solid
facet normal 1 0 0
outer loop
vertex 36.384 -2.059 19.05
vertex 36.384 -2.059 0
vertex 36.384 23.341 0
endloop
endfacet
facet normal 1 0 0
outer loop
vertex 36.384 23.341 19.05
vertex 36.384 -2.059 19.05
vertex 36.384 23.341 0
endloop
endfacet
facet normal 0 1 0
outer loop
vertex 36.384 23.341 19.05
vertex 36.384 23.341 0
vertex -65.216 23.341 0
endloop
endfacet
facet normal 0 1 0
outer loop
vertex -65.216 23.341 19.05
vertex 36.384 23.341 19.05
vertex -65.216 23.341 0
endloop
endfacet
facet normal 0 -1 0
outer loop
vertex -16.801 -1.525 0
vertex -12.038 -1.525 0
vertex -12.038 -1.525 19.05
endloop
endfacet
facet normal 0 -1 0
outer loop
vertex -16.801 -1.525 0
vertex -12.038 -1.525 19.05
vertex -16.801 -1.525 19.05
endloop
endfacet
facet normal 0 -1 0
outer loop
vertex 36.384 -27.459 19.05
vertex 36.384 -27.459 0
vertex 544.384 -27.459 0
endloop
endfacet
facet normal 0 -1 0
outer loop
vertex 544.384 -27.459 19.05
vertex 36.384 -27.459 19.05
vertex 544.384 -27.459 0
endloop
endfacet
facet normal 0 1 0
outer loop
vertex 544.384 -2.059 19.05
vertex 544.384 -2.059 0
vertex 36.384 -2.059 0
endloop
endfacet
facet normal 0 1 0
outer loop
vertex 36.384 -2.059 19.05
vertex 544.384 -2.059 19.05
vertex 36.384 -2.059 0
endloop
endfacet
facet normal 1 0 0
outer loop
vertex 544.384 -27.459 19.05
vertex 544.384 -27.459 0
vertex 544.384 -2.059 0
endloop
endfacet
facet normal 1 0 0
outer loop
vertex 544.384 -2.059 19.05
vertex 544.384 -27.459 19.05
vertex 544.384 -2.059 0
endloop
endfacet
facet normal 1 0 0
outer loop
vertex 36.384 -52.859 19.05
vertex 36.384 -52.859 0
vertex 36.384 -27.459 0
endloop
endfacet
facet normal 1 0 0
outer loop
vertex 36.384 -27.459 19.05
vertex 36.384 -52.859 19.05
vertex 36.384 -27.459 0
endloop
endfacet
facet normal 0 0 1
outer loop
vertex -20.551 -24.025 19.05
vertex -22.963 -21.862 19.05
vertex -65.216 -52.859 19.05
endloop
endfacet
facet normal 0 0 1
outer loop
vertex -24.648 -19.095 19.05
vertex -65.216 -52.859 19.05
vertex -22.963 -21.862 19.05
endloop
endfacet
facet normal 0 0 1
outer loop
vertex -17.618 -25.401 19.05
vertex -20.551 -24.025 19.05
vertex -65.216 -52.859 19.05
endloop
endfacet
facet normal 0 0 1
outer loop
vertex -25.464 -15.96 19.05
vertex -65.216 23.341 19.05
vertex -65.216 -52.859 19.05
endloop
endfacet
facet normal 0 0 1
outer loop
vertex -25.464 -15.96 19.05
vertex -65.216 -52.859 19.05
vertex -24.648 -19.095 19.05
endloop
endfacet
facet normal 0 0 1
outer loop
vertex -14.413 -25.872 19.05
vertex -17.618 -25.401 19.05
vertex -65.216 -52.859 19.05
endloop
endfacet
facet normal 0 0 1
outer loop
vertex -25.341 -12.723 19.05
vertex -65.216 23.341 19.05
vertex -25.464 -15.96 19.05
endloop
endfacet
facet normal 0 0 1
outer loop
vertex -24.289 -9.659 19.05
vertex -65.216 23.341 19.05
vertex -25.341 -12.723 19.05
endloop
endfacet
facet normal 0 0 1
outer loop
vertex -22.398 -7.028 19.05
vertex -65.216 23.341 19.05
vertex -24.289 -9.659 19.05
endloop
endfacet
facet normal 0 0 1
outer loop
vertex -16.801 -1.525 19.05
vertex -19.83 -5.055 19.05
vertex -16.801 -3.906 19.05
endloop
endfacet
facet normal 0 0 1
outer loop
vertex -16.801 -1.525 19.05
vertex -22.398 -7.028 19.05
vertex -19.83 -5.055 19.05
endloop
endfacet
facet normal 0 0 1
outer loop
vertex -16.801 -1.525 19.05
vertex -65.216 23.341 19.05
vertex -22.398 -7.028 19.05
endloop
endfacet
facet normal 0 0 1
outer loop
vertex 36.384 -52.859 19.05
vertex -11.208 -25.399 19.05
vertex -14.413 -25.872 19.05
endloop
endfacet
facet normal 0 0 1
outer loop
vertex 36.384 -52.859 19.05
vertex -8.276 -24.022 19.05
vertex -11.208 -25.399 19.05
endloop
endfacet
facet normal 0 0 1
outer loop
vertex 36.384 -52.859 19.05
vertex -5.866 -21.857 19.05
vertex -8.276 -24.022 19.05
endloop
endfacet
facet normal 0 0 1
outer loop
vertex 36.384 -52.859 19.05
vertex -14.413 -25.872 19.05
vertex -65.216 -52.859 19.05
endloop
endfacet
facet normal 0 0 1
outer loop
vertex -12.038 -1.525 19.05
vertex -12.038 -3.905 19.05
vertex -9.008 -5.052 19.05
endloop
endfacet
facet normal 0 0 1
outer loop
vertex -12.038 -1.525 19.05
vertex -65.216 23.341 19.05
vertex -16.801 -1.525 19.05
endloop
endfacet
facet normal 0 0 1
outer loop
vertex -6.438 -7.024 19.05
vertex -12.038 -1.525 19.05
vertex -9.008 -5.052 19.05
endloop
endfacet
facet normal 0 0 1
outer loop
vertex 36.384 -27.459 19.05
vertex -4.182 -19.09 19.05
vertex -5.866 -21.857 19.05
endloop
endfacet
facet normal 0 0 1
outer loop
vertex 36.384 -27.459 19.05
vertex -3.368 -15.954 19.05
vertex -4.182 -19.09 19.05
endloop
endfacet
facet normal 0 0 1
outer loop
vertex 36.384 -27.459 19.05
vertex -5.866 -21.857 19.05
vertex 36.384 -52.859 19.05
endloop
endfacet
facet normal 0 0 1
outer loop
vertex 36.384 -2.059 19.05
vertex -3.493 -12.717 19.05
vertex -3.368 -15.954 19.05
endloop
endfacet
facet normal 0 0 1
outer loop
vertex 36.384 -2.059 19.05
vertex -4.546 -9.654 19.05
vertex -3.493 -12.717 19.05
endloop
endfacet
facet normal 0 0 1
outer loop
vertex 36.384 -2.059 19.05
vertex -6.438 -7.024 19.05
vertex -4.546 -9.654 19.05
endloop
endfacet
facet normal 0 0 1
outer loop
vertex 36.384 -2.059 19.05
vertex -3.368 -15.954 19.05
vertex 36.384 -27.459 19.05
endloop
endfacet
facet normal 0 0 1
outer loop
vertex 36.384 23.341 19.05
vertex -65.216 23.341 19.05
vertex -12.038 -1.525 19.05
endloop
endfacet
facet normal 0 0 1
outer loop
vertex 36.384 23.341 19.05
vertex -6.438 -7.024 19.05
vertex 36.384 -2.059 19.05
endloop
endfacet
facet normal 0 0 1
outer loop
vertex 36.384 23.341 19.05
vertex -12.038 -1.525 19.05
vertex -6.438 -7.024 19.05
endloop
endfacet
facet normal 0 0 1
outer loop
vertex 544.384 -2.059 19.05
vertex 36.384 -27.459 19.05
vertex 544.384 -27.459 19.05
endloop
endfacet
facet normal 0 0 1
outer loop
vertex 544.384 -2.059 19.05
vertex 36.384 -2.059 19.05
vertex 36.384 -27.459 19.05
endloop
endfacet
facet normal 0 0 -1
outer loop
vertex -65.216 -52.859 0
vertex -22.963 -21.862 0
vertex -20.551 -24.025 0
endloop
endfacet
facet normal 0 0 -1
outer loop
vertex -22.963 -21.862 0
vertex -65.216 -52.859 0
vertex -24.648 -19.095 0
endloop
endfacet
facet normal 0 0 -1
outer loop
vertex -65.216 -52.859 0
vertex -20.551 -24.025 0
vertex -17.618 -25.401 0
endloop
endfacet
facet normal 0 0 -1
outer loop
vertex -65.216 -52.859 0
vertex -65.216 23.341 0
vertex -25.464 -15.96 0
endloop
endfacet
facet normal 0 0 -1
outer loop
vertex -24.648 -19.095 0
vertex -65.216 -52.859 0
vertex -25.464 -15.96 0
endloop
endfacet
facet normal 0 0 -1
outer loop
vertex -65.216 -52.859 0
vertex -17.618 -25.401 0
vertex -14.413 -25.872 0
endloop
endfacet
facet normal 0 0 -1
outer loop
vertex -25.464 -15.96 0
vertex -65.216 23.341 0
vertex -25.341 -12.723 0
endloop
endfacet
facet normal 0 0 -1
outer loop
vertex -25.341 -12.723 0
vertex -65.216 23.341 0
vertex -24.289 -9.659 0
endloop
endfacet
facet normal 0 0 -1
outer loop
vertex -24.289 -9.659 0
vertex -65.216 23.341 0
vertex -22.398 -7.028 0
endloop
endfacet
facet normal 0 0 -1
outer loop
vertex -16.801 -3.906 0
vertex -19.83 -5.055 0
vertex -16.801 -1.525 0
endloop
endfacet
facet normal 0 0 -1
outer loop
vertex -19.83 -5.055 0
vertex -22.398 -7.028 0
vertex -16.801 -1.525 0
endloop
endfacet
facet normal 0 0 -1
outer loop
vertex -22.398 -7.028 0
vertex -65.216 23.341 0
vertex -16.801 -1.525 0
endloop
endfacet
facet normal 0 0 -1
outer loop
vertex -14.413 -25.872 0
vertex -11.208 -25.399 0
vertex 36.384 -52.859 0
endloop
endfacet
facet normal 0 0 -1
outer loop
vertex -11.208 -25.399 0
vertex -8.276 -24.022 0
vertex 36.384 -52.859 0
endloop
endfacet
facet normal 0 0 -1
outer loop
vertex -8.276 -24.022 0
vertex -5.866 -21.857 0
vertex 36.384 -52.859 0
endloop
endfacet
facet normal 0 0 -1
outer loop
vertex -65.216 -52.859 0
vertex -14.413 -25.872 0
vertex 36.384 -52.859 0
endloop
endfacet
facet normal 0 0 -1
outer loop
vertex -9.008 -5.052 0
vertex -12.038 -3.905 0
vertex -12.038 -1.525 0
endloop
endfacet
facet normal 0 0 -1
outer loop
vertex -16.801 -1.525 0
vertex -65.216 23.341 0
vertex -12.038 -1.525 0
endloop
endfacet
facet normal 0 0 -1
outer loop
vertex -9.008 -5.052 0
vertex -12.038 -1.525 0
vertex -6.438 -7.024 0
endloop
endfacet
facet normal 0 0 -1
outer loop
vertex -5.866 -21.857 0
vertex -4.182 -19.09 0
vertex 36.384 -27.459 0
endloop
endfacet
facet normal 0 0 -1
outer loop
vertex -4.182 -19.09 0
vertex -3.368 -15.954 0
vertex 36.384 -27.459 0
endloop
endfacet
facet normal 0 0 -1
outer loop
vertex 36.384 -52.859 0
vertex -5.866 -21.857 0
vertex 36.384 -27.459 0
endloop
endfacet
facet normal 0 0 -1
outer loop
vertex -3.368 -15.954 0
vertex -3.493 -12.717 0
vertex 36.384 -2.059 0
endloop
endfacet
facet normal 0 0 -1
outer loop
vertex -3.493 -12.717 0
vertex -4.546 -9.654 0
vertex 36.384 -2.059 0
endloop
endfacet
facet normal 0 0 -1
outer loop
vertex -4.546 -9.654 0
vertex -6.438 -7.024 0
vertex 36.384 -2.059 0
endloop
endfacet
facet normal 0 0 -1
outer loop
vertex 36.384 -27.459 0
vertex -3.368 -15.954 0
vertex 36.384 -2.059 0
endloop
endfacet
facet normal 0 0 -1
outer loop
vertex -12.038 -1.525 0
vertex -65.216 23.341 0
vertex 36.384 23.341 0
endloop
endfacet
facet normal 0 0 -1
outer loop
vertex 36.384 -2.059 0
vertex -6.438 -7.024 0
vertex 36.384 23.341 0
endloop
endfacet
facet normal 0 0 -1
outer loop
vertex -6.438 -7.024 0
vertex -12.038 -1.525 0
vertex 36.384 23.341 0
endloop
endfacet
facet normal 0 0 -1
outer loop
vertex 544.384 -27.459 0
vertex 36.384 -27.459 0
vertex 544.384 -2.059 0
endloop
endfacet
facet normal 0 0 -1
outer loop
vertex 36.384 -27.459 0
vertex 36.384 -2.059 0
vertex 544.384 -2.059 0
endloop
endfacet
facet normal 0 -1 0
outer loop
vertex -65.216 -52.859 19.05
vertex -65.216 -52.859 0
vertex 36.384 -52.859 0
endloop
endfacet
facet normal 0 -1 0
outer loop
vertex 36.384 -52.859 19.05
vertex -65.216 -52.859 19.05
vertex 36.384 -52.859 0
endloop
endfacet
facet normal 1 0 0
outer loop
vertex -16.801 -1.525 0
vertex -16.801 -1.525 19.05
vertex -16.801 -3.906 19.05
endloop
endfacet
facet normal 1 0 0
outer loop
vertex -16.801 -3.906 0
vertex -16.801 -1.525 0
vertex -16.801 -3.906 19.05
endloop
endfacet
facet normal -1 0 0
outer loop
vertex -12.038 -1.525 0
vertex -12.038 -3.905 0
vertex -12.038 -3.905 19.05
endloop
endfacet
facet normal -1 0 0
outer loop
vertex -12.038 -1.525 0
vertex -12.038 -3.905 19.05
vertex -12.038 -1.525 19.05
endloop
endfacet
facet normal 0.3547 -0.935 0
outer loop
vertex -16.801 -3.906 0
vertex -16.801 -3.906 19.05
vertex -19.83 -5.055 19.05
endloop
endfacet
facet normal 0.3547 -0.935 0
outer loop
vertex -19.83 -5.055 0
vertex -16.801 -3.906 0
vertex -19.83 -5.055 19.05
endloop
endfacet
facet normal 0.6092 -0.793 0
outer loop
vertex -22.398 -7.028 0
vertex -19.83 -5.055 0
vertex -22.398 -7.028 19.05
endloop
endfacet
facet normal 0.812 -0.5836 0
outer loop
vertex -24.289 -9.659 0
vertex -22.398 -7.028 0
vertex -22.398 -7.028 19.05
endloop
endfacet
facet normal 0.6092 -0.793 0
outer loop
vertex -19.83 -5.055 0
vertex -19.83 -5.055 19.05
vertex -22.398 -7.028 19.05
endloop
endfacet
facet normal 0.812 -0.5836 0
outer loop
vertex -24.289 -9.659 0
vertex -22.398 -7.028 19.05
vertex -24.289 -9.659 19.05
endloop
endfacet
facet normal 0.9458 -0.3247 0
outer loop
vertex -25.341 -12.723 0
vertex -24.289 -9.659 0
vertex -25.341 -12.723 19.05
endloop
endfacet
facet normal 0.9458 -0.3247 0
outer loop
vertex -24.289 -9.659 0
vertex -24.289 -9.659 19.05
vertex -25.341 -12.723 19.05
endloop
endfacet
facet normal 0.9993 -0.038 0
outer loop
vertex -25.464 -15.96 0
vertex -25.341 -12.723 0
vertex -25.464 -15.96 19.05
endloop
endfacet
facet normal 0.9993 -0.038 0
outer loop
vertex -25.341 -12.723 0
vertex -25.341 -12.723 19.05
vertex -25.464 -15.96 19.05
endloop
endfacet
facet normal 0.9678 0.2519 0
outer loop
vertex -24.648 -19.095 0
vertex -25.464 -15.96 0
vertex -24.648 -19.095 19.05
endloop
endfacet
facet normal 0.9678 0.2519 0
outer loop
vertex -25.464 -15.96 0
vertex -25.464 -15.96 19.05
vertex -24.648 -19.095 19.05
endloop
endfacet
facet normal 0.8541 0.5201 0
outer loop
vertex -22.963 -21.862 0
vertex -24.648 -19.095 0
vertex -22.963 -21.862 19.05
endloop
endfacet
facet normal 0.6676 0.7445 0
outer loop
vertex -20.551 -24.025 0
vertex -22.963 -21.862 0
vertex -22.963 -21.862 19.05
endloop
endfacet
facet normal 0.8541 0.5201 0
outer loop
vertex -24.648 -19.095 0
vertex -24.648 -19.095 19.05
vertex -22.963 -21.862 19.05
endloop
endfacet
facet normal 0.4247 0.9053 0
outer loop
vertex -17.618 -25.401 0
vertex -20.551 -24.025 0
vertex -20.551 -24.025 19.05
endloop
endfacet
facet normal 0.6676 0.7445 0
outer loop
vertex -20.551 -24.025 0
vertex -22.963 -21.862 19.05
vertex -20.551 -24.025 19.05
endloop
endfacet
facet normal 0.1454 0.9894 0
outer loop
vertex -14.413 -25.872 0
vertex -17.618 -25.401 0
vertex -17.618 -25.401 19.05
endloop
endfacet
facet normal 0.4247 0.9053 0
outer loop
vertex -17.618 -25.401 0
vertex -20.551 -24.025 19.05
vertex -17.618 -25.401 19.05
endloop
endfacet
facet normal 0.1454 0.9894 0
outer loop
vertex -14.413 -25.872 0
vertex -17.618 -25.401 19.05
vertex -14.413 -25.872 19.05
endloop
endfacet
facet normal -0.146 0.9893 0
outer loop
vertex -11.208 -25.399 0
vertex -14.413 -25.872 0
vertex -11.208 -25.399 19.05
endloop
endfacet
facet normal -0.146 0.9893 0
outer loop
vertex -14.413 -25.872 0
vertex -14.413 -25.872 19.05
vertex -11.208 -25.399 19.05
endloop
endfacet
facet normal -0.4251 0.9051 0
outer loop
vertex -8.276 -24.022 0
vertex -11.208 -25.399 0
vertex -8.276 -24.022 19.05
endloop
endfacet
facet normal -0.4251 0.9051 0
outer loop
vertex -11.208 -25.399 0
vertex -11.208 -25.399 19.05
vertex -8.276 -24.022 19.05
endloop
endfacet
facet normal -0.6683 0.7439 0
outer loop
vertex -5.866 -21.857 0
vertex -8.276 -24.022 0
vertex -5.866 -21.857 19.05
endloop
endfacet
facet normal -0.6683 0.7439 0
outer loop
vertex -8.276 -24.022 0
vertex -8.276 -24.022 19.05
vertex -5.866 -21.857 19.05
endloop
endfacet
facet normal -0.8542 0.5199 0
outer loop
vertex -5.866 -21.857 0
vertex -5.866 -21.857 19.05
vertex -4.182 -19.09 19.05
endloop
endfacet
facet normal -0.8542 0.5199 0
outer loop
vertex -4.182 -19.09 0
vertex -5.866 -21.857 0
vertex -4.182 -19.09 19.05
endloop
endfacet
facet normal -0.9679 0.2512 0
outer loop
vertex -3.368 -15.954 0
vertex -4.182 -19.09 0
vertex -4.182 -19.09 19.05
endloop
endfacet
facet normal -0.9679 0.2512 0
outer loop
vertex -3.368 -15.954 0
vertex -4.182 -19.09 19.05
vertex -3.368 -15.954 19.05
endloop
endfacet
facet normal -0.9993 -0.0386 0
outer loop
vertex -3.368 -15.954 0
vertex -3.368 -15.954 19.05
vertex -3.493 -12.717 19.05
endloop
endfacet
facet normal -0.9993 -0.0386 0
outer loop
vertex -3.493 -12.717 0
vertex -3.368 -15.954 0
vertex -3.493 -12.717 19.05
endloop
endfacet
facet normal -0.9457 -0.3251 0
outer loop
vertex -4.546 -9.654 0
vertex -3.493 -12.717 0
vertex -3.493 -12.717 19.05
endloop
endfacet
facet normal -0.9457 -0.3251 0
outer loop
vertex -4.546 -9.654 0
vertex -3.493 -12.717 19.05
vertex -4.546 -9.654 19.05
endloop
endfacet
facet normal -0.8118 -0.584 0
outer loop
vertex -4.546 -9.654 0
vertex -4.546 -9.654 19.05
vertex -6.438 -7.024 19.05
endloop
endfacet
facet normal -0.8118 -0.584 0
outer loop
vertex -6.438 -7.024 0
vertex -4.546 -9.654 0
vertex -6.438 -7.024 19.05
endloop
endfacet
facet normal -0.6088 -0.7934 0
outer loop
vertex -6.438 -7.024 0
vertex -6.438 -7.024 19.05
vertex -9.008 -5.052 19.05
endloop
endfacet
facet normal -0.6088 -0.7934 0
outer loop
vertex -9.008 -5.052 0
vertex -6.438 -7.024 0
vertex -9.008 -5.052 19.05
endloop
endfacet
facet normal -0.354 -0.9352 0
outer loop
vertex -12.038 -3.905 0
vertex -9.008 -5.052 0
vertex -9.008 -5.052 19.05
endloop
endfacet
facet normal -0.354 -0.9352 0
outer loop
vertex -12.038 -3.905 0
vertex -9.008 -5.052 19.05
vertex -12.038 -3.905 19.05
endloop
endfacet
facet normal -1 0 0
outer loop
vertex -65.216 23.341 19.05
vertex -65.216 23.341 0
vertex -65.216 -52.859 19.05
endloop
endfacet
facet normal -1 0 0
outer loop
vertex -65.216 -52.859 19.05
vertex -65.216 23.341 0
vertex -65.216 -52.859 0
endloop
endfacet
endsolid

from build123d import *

# Parameters (mm, degrees)
BOSS_EXTRUDE1_DEPTH = 19.05
CUT_EXTRUDE1_DEPTH  = 20.05


with BuildPart() as part:
    # Sketch1 → Boss-Extrude1 (new body)
    with BuildSketch(Plane.XY):
        Polygon((-65.216216216, 23.340540541), (-65.216216216, -52.859459459), (36.383783784, -52.859459459), (36.383783784, -27.459459459), (544.383783784, -27.459459459), (544.383783784, -2.059459459), (36.383783784, -2.059459459), (36.383783784, 23.340540541), align=None)
    extrude(amount=BOSS_EXTRUDE1_DEPTH)

    # Sketch2 → Cut-Extrude1 (cut, through all)
    with BuildSketch(Plane.XY.offset(19.05)):
        with BuildLine():
            Line((-12.037570257, -3.904520508), (-12.038141216, -1.524538483))
            Line((-12.038141216, -1.524538483), (-16.800641216, -1.524538483))
            Line((-16.800641216, -1.524538483), (-16.800641216, -3.905788483))
            ThreePointArc((-16.800641216, -3.905788483), (-14.413257962, -25.871959066), (-12.037570257, -3.904520508))
        make_face()
    extrude(amount=-CUT_EXTRUDE1_DEPTH, mode=Mode.SUBTRACT)


solid = part.part
